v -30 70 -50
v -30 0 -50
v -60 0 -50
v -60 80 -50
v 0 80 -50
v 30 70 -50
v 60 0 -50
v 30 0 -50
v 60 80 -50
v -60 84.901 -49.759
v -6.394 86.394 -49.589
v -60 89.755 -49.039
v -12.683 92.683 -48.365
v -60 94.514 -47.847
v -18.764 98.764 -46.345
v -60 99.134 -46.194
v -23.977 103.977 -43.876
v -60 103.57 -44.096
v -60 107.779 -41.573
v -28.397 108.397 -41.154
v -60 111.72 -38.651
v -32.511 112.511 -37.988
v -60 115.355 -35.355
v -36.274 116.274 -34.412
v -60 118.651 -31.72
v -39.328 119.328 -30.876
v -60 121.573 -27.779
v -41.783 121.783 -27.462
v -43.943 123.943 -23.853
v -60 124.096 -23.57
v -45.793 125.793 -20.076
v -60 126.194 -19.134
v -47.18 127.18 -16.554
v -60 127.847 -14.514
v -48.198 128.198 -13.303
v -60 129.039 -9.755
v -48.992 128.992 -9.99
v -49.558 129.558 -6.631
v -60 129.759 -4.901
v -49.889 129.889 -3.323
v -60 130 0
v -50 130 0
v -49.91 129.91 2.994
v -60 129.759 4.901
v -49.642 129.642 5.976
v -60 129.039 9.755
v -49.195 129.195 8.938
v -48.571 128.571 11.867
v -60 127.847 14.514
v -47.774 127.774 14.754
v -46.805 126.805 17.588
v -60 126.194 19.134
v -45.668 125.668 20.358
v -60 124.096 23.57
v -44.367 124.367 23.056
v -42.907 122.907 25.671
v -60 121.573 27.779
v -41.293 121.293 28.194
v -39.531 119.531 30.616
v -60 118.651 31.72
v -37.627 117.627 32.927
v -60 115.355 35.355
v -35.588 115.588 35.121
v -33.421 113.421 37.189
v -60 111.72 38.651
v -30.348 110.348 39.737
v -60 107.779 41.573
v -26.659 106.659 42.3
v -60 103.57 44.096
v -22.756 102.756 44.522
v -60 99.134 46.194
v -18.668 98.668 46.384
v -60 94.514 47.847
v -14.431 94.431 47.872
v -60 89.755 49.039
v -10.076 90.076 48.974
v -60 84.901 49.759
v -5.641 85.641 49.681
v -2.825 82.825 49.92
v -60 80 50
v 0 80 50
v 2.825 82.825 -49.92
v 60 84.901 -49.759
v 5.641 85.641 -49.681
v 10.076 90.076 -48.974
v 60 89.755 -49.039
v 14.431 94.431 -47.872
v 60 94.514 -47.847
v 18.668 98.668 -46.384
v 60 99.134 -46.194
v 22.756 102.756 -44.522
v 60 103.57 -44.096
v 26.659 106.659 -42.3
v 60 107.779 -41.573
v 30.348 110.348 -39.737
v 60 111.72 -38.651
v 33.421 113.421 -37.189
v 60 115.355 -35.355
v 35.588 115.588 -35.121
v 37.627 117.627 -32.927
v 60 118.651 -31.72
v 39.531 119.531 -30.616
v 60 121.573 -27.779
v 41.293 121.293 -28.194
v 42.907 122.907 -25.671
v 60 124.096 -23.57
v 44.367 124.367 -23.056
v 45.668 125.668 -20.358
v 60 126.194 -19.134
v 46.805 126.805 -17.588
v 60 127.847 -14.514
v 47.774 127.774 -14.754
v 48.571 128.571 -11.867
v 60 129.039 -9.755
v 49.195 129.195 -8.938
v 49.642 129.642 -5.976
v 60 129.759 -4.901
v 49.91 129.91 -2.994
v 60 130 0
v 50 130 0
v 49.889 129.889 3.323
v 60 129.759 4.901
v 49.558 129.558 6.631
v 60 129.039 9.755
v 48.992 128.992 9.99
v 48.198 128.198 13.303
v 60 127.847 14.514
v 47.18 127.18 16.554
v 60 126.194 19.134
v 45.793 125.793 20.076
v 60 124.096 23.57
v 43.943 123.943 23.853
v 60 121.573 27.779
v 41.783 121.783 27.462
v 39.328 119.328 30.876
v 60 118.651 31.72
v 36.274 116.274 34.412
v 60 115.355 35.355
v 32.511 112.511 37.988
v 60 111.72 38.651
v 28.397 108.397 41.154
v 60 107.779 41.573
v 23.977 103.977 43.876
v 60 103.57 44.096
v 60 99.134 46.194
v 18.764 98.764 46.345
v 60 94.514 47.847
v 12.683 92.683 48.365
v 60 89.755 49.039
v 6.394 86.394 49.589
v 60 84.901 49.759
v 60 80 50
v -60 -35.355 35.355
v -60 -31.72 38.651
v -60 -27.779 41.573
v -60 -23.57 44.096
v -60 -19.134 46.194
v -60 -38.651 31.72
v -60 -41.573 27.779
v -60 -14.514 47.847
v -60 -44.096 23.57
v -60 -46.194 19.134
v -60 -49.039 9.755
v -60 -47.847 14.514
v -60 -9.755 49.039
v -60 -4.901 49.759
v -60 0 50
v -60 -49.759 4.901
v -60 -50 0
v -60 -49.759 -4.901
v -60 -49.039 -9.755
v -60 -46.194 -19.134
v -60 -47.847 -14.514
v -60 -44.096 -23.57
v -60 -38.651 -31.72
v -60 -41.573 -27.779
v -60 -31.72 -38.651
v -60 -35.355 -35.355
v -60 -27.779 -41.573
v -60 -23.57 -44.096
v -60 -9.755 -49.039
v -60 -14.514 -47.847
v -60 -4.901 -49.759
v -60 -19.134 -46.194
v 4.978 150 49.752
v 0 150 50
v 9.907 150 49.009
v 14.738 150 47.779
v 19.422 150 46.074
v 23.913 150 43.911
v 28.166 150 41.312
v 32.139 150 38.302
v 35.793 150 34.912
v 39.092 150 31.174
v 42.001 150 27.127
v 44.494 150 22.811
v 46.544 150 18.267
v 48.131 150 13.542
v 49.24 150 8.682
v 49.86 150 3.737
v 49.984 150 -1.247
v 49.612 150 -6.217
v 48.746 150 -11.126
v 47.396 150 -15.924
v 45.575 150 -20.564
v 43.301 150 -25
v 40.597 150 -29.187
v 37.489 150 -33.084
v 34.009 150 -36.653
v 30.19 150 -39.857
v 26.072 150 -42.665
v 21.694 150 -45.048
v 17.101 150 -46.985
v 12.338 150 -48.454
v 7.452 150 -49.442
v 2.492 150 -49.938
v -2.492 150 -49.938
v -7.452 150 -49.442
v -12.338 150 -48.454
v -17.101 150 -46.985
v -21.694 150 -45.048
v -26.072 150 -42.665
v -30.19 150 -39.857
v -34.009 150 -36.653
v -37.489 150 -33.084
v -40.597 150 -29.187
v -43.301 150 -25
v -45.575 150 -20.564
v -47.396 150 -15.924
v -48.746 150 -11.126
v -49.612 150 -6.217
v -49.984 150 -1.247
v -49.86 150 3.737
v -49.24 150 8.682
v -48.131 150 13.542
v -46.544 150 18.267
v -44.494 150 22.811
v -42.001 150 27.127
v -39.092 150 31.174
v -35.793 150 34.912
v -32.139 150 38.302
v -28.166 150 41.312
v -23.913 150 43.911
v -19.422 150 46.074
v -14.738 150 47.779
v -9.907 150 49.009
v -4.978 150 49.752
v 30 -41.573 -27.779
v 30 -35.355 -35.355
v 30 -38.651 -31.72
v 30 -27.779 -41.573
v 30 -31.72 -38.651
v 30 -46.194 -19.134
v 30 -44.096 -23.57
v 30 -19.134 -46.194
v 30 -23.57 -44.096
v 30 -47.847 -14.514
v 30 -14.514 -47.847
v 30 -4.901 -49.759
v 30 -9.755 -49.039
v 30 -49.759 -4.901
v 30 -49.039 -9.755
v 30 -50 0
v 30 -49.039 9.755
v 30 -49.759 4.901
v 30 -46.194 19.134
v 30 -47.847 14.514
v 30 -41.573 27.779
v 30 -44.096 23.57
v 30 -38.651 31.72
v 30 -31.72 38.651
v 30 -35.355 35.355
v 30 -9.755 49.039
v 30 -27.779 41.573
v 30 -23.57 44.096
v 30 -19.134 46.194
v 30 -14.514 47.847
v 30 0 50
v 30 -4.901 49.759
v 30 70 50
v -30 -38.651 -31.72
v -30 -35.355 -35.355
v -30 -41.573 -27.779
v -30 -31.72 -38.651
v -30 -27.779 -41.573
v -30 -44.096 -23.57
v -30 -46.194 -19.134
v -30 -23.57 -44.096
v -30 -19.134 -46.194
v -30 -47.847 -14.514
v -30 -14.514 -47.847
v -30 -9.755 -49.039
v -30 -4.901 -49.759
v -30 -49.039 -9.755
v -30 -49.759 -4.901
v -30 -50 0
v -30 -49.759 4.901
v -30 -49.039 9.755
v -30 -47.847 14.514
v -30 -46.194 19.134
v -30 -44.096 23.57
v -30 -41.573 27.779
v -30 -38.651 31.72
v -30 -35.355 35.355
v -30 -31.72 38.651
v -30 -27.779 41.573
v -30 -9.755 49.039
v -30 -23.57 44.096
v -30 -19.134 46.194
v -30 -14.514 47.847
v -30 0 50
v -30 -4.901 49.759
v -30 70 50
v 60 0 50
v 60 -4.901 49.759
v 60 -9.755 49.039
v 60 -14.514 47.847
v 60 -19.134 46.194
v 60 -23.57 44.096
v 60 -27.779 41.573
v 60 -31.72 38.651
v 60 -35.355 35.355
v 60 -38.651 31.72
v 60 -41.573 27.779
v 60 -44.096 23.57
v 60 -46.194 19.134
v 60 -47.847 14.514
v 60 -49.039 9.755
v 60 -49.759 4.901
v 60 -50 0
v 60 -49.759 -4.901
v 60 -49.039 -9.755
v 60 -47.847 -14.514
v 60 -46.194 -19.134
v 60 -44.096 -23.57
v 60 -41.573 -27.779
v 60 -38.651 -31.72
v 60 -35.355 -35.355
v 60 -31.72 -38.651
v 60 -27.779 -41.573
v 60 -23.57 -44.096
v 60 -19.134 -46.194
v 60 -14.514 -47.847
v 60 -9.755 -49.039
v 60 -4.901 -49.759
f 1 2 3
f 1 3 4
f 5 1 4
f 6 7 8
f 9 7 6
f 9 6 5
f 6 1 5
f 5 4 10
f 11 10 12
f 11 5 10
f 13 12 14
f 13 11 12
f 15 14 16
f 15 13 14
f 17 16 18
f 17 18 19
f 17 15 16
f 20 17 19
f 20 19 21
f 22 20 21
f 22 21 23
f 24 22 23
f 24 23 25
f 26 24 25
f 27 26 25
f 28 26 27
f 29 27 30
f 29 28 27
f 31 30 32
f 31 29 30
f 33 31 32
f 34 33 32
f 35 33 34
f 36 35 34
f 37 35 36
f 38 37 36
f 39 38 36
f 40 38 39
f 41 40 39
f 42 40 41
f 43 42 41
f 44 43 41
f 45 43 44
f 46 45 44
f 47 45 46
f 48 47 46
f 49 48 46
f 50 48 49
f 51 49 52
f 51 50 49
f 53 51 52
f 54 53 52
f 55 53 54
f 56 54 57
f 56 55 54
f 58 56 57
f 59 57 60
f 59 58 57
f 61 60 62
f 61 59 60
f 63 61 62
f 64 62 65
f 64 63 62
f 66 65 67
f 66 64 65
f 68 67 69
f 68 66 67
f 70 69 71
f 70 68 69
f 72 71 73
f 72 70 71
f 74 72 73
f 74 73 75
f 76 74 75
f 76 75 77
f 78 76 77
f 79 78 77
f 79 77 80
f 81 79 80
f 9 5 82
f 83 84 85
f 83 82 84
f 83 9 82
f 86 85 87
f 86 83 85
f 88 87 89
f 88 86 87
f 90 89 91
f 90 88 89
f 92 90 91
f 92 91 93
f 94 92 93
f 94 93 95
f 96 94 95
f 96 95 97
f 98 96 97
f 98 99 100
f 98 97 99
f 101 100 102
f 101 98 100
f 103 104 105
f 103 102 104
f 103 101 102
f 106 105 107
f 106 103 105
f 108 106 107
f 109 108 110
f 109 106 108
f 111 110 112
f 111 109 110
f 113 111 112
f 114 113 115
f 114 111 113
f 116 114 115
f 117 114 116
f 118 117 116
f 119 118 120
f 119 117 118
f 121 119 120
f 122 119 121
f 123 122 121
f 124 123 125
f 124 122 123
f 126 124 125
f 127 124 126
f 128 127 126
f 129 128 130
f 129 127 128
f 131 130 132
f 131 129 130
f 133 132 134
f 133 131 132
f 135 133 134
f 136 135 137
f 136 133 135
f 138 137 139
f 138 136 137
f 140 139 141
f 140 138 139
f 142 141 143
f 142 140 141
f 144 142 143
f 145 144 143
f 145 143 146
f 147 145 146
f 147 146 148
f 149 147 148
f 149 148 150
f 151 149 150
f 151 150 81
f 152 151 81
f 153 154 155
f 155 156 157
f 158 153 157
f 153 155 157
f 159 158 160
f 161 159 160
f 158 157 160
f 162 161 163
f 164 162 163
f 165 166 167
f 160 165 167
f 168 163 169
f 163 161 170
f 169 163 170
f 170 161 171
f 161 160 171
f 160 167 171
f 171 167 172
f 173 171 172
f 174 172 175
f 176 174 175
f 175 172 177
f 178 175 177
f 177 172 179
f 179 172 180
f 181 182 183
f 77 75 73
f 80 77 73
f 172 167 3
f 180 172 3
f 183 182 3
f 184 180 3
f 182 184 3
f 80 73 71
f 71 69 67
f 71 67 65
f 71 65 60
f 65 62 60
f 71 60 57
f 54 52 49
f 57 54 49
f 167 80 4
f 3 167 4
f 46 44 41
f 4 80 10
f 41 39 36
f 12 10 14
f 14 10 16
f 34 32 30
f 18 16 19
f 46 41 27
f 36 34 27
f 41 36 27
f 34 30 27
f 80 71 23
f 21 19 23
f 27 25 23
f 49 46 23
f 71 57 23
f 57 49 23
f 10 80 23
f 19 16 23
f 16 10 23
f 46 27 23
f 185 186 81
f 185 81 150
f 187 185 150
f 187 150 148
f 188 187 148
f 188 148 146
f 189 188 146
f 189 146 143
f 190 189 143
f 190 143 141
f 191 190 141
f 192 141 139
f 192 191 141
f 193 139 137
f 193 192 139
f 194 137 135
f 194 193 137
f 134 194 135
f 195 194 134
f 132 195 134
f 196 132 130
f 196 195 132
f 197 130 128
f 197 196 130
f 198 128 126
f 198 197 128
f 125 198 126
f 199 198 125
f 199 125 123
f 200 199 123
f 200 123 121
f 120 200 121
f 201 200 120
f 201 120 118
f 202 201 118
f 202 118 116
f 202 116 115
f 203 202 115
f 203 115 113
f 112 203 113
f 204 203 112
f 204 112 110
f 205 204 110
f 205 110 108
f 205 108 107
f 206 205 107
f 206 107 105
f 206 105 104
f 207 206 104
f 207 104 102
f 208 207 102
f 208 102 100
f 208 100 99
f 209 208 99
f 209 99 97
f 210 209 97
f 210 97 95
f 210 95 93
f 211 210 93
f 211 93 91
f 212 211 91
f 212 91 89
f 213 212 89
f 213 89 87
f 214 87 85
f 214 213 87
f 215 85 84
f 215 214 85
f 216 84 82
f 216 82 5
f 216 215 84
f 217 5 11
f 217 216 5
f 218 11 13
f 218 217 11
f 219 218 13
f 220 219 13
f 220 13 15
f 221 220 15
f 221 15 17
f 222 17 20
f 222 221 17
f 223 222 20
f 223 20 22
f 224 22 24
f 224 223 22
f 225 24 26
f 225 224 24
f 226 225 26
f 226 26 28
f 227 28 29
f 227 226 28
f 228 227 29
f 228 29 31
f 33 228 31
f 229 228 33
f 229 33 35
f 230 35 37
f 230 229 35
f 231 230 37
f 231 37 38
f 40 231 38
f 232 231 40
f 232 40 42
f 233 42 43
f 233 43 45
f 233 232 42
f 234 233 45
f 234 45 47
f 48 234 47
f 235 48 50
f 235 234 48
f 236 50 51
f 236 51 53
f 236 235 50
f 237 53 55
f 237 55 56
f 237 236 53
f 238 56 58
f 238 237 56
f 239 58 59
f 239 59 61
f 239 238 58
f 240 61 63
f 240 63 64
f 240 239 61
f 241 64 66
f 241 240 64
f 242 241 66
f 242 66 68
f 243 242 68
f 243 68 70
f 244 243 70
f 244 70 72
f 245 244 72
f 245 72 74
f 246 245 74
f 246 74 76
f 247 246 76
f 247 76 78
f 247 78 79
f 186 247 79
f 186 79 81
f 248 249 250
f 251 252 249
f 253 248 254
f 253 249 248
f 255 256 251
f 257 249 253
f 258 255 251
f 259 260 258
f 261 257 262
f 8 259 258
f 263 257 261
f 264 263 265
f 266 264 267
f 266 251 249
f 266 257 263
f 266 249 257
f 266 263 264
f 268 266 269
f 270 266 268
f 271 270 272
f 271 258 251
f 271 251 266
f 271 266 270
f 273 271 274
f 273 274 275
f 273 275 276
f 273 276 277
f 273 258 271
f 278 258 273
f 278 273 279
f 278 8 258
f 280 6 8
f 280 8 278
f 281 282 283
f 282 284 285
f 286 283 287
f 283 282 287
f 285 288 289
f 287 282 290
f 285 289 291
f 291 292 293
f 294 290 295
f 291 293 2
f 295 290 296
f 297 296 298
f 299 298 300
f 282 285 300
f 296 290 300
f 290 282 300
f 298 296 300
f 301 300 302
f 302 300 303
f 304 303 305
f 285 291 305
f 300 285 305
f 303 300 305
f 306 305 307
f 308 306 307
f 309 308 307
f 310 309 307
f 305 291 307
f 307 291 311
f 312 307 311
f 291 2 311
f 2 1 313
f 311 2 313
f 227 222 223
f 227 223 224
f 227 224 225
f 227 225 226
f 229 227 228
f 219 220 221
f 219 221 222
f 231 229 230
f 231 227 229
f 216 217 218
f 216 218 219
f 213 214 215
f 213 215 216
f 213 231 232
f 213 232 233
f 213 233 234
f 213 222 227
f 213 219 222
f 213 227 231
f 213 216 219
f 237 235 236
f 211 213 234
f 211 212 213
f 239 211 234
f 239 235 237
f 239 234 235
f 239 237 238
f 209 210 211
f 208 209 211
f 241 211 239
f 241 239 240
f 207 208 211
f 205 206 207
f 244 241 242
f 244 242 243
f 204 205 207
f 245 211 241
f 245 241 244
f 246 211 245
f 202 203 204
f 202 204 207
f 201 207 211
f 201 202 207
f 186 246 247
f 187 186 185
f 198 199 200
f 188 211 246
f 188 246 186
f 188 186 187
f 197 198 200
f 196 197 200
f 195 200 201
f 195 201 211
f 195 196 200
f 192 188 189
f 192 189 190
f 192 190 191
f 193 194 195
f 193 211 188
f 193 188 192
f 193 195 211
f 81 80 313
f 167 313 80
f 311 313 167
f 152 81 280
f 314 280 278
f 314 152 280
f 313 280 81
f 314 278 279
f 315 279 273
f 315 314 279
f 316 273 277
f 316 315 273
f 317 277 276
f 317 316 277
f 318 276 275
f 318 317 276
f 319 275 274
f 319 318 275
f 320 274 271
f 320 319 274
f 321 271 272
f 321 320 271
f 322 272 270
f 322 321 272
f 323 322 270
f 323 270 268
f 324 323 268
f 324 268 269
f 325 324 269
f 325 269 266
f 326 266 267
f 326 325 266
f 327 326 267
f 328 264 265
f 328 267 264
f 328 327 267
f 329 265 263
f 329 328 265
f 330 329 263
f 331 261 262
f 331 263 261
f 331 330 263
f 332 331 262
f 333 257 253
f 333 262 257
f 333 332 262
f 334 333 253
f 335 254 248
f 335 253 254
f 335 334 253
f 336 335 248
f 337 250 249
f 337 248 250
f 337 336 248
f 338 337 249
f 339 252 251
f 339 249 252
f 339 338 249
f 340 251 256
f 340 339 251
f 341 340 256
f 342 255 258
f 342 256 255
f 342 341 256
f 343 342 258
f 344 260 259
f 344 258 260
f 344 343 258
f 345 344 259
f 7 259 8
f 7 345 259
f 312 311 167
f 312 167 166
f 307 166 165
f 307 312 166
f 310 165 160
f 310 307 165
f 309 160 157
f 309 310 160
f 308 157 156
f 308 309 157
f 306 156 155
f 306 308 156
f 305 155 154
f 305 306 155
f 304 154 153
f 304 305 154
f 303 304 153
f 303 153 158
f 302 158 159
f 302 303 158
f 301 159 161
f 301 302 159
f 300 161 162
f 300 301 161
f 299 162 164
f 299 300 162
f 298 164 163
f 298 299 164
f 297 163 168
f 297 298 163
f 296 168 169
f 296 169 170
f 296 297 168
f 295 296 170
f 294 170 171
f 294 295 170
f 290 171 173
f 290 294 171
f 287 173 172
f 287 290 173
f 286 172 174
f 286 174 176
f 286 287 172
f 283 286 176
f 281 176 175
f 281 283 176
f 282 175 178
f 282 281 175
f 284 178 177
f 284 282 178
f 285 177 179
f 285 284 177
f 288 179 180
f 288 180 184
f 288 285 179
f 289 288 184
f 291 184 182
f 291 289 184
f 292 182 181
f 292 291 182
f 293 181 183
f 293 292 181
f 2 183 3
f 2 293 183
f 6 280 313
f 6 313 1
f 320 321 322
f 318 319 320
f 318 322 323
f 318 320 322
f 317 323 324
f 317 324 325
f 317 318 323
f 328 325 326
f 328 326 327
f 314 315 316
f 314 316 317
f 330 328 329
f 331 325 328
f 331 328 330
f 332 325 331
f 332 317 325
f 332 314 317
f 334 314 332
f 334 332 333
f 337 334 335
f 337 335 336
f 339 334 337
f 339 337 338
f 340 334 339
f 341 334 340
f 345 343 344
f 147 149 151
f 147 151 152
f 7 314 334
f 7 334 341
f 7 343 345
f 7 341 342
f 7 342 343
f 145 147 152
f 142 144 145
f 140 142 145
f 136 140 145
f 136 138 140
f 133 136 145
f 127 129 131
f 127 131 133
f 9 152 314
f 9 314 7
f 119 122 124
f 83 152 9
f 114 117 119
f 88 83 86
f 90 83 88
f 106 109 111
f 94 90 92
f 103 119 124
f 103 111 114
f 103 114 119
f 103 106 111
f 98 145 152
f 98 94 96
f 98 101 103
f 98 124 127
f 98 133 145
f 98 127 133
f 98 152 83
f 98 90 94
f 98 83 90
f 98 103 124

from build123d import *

# Parameters (mm, degrees)
SALIENTE_EXTRUIR1_DEPTH      = 60
CORTAR_EXTRUIR1_DEPTH        = 30
SALIENTE_EXTRUIR2_REACH      = 216.709
SALIENTE_EXTRUIR2_END_RADIUS = 50
CROQUIS3_R                   = 50


with BuildPart() as part:
    # Croquis1 → Saliente-Extruir1 (new, symmetric)
    with BuildSketch(Plane(origin=(0, 0, 0), x_dir=(0, 0, -1), z_dir=(1, 0, 0))):
        with BuildLine():
            Line((-50, 80), (-50, 0))
            ThreePointArc((-50, 0), (0, -50), (50, 0))
            Line((50, 0), (50, 80))
            ThreePointArc((50, 80), (0, 130), (-50, 80))
        make_face()
    extrude(amount=SALIENTE_EXTRUIR1_DEPTH, both=True)

    # Croquis2 → Cortar-Extruir1 (cut, symmetric)
    with BuildSketch(Plane(origin=(0, 0, 0), x_dir=(0, 0, -1), z_dir=(1, 0, 0))):
        with BuildLine():
            Line((-50, 70), (50, 70))
            Line((50, 70), (50, 0))
            ThreePointArc((50, 0), (0, -50), (-50, 0))
            Line((-50, 0), (-50, 70))
        make_face()
    extrude(amount=CORTAR_EXTRUIR1_DEPTH, both=True, mode=Mode.SUBTRACT)

    # Saliente-Extruir2: up to this cylinder (the profile starts outside it)
    saliente_extruir2_end = Plane(origin=(0, 80, 0), z_dir=(-1, 0, 0)) * Cylinder(SALIENTE_EXTRUIR2_END_RADIUS, 534.418, mode=Mode.PRIVATE)
    # Croquis3 → Saliente-Extruir2 (add, up to the surface)
    with BuildSketch(Plane(origin=(0, 150, 0), x_dir=(1, 0, 0), z_dir=(0, 1, 0)), mode=Mode.PRIVATE) as saliente_extruir2_sk1:
        with Locations(Location((0, 0, 0), (0, 0, 270))):
            Circle(CROQUIS3_R)
    saliente_extruir2_tool1 = extrude(saliente_extruir2_sk1.sketch, amount=-SALIENTE_EXTRUIR2_REACH, mode=Mode.PRIVATE) - saliente_extruir2_end
    add(saliente_extruir2_tool1.solids().sort_by_distance((0, 150, 0))[0])


solid = part.part
